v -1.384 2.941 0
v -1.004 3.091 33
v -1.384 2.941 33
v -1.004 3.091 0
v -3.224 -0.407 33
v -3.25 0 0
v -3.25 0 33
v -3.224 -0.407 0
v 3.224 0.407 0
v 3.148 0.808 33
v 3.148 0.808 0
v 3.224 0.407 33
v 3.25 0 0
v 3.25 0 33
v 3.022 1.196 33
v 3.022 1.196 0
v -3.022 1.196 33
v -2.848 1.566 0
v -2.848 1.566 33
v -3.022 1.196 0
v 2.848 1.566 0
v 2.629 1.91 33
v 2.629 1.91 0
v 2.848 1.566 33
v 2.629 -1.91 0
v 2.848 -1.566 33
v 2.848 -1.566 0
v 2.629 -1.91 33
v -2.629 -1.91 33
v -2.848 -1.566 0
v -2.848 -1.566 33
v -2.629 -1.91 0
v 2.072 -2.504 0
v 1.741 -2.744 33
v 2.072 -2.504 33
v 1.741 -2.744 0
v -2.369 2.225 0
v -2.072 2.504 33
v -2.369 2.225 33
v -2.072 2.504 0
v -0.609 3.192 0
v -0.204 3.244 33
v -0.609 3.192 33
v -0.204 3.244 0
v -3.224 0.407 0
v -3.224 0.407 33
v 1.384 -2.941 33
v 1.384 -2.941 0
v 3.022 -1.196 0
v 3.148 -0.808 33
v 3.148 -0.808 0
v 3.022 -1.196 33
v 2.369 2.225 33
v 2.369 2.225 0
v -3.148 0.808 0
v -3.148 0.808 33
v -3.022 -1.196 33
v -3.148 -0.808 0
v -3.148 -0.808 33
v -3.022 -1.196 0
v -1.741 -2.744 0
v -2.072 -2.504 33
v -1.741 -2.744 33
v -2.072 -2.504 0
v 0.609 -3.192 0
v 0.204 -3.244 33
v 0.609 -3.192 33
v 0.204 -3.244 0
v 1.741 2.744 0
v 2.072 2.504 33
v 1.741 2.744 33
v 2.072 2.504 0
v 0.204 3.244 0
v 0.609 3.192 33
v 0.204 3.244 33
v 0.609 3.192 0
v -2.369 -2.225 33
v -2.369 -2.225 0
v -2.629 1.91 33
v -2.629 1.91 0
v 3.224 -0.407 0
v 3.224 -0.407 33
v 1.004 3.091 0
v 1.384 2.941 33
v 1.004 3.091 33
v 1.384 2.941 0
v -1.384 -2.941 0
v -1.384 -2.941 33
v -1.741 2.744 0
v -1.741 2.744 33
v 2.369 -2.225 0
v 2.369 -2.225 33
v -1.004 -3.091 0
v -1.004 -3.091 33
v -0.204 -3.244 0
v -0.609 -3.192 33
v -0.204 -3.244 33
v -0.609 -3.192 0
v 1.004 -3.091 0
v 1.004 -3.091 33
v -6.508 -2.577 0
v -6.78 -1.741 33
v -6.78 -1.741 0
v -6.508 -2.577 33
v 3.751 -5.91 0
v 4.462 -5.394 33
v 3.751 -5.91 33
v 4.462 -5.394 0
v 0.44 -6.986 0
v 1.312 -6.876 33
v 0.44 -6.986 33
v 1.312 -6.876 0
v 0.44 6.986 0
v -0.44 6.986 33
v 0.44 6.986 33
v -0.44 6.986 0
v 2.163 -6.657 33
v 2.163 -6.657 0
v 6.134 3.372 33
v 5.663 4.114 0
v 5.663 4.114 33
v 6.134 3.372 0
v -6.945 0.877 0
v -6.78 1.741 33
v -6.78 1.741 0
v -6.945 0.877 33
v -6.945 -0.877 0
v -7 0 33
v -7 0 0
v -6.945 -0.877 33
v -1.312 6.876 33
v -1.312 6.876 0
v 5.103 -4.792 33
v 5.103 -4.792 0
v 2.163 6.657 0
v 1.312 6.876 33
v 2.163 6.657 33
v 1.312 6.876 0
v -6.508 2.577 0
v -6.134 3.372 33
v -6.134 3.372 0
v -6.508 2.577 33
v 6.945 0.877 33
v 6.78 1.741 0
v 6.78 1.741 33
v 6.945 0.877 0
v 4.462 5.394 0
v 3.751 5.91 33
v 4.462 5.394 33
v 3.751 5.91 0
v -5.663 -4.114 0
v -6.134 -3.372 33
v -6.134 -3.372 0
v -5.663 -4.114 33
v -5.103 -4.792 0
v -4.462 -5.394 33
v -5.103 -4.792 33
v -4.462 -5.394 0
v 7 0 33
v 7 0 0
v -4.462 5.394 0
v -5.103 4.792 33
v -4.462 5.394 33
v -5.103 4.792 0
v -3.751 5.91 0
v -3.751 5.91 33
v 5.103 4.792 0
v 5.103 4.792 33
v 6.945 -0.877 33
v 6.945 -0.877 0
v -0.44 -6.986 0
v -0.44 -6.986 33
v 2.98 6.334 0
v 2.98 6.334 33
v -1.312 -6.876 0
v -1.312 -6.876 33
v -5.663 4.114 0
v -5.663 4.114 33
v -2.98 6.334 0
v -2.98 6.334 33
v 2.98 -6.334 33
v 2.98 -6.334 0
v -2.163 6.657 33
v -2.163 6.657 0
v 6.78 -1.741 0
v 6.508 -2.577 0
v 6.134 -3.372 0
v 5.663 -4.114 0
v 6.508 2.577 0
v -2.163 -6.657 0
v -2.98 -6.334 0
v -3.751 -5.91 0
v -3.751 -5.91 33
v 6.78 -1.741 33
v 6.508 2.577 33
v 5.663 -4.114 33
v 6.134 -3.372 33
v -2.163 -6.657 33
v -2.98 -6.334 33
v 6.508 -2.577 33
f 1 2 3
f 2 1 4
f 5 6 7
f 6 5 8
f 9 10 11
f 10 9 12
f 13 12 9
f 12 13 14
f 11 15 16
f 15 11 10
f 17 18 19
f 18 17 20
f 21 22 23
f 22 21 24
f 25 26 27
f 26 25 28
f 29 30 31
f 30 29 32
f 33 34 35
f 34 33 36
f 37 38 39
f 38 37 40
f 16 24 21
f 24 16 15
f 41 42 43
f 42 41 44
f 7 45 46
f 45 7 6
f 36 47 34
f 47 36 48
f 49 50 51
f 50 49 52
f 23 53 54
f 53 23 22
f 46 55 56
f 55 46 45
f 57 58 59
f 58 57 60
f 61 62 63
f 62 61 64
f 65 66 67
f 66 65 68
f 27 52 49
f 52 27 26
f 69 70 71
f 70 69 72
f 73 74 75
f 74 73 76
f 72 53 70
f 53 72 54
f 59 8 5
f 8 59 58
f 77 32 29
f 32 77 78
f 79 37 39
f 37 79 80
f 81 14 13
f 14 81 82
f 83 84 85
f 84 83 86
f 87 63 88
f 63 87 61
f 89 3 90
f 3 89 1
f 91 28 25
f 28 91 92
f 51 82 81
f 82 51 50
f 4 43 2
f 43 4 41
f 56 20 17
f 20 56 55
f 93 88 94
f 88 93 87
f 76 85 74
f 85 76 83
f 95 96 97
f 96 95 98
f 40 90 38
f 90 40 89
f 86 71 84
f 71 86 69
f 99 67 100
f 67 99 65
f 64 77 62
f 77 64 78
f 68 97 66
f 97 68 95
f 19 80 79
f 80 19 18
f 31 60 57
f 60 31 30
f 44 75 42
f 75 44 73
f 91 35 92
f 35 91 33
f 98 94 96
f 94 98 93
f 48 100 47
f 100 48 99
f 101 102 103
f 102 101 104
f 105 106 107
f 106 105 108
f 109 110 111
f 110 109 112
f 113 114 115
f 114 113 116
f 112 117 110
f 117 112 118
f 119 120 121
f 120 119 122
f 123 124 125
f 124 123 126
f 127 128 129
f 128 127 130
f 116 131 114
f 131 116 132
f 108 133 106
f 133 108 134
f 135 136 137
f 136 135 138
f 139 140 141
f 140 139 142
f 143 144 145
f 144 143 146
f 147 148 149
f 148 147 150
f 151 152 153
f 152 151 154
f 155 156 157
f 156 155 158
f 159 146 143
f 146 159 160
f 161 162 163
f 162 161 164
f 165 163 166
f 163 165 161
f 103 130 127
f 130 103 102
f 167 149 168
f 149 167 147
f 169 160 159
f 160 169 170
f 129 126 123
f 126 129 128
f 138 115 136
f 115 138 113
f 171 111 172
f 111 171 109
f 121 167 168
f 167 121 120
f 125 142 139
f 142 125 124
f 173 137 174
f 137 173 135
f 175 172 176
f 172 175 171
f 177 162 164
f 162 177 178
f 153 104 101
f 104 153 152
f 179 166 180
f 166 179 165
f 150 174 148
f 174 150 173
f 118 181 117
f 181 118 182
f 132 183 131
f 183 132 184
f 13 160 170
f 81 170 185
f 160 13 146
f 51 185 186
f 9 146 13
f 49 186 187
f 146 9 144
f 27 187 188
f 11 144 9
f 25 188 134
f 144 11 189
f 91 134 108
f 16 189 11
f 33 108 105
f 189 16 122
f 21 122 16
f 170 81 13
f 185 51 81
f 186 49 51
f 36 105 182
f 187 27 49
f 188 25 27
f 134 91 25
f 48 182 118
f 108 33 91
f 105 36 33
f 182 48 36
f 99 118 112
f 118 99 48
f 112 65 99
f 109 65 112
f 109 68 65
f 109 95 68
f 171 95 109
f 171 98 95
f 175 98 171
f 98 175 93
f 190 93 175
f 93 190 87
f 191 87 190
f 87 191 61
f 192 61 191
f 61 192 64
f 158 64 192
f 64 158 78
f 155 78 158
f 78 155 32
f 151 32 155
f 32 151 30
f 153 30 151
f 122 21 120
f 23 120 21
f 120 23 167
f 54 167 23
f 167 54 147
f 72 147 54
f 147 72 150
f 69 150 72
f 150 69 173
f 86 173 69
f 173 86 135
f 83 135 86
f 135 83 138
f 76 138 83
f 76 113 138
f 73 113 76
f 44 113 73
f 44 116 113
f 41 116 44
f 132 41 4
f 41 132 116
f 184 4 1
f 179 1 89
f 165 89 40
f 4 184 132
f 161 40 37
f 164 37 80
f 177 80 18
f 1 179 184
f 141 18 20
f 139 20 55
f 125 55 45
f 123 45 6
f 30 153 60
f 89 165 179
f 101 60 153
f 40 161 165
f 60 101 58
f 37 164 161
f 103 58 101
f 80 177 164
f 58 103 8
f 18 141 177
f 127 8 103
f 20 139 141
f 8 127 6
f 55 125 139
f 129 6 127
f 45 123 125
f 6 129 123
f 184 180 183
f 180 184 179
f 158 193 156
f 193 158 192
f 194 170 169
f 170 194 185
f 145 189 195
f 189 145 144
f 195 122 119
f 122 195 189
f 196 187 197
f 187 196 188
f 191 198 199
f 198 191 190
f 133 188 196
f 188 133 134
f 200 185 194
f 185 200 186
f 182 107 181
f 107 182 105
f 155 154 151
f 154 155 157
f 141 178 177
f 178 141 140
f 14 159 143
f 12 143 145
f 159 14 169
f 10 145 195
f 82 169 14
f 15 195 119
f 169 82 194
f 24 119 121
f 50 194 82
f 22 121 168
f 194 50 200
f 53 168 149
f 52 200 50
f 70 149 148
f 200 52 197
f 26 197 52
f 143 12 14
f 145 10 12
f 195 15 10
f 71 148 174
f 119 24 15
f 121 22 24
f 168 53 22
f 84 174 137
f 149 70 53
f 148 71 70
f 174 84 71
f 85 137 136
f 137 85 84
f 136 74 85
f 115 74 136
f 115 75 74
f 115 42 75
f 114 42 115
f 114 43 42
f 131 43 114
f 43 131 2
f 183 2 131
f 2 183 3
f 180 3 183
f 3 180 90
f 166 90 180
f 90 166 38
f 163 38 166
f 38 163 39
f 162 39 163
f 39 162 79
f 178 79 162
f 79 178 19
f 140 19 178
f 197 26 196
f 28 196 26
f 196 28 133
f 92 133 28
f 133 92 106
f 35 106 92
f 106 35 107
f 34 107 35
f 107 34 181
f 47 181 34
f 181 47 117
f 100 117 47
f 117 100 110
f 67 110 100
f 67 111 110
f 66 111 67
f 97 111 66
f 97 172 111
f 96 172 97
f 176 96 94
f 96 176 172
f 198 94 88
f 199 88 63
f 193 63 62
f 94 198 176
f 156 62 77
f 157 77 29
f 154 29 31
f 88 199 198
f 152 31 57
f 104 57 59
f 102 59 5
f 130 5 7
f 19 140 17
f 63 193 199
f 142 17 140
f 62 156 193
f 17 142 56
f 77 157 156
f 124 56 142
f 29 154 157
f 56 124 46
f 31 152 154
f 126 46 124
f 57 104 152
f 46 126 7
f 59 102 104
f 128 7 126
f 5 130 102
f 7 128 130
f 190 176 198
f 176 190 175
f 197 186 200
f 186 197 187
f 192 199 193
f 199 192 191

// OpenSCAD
$fn = 50;


difference() {
	union() {
		cylinder(h = 33, r = 7.0000000000);
	}
	union() {
		translate(v = [0, 0, -100]) {
			cylinder(h = 200, r = 3.2500000000);
		}
		translate(v = [0, 0, -100]) {
			cylinder(h = 200, r = 1.8000000000);
		}
	}
}
